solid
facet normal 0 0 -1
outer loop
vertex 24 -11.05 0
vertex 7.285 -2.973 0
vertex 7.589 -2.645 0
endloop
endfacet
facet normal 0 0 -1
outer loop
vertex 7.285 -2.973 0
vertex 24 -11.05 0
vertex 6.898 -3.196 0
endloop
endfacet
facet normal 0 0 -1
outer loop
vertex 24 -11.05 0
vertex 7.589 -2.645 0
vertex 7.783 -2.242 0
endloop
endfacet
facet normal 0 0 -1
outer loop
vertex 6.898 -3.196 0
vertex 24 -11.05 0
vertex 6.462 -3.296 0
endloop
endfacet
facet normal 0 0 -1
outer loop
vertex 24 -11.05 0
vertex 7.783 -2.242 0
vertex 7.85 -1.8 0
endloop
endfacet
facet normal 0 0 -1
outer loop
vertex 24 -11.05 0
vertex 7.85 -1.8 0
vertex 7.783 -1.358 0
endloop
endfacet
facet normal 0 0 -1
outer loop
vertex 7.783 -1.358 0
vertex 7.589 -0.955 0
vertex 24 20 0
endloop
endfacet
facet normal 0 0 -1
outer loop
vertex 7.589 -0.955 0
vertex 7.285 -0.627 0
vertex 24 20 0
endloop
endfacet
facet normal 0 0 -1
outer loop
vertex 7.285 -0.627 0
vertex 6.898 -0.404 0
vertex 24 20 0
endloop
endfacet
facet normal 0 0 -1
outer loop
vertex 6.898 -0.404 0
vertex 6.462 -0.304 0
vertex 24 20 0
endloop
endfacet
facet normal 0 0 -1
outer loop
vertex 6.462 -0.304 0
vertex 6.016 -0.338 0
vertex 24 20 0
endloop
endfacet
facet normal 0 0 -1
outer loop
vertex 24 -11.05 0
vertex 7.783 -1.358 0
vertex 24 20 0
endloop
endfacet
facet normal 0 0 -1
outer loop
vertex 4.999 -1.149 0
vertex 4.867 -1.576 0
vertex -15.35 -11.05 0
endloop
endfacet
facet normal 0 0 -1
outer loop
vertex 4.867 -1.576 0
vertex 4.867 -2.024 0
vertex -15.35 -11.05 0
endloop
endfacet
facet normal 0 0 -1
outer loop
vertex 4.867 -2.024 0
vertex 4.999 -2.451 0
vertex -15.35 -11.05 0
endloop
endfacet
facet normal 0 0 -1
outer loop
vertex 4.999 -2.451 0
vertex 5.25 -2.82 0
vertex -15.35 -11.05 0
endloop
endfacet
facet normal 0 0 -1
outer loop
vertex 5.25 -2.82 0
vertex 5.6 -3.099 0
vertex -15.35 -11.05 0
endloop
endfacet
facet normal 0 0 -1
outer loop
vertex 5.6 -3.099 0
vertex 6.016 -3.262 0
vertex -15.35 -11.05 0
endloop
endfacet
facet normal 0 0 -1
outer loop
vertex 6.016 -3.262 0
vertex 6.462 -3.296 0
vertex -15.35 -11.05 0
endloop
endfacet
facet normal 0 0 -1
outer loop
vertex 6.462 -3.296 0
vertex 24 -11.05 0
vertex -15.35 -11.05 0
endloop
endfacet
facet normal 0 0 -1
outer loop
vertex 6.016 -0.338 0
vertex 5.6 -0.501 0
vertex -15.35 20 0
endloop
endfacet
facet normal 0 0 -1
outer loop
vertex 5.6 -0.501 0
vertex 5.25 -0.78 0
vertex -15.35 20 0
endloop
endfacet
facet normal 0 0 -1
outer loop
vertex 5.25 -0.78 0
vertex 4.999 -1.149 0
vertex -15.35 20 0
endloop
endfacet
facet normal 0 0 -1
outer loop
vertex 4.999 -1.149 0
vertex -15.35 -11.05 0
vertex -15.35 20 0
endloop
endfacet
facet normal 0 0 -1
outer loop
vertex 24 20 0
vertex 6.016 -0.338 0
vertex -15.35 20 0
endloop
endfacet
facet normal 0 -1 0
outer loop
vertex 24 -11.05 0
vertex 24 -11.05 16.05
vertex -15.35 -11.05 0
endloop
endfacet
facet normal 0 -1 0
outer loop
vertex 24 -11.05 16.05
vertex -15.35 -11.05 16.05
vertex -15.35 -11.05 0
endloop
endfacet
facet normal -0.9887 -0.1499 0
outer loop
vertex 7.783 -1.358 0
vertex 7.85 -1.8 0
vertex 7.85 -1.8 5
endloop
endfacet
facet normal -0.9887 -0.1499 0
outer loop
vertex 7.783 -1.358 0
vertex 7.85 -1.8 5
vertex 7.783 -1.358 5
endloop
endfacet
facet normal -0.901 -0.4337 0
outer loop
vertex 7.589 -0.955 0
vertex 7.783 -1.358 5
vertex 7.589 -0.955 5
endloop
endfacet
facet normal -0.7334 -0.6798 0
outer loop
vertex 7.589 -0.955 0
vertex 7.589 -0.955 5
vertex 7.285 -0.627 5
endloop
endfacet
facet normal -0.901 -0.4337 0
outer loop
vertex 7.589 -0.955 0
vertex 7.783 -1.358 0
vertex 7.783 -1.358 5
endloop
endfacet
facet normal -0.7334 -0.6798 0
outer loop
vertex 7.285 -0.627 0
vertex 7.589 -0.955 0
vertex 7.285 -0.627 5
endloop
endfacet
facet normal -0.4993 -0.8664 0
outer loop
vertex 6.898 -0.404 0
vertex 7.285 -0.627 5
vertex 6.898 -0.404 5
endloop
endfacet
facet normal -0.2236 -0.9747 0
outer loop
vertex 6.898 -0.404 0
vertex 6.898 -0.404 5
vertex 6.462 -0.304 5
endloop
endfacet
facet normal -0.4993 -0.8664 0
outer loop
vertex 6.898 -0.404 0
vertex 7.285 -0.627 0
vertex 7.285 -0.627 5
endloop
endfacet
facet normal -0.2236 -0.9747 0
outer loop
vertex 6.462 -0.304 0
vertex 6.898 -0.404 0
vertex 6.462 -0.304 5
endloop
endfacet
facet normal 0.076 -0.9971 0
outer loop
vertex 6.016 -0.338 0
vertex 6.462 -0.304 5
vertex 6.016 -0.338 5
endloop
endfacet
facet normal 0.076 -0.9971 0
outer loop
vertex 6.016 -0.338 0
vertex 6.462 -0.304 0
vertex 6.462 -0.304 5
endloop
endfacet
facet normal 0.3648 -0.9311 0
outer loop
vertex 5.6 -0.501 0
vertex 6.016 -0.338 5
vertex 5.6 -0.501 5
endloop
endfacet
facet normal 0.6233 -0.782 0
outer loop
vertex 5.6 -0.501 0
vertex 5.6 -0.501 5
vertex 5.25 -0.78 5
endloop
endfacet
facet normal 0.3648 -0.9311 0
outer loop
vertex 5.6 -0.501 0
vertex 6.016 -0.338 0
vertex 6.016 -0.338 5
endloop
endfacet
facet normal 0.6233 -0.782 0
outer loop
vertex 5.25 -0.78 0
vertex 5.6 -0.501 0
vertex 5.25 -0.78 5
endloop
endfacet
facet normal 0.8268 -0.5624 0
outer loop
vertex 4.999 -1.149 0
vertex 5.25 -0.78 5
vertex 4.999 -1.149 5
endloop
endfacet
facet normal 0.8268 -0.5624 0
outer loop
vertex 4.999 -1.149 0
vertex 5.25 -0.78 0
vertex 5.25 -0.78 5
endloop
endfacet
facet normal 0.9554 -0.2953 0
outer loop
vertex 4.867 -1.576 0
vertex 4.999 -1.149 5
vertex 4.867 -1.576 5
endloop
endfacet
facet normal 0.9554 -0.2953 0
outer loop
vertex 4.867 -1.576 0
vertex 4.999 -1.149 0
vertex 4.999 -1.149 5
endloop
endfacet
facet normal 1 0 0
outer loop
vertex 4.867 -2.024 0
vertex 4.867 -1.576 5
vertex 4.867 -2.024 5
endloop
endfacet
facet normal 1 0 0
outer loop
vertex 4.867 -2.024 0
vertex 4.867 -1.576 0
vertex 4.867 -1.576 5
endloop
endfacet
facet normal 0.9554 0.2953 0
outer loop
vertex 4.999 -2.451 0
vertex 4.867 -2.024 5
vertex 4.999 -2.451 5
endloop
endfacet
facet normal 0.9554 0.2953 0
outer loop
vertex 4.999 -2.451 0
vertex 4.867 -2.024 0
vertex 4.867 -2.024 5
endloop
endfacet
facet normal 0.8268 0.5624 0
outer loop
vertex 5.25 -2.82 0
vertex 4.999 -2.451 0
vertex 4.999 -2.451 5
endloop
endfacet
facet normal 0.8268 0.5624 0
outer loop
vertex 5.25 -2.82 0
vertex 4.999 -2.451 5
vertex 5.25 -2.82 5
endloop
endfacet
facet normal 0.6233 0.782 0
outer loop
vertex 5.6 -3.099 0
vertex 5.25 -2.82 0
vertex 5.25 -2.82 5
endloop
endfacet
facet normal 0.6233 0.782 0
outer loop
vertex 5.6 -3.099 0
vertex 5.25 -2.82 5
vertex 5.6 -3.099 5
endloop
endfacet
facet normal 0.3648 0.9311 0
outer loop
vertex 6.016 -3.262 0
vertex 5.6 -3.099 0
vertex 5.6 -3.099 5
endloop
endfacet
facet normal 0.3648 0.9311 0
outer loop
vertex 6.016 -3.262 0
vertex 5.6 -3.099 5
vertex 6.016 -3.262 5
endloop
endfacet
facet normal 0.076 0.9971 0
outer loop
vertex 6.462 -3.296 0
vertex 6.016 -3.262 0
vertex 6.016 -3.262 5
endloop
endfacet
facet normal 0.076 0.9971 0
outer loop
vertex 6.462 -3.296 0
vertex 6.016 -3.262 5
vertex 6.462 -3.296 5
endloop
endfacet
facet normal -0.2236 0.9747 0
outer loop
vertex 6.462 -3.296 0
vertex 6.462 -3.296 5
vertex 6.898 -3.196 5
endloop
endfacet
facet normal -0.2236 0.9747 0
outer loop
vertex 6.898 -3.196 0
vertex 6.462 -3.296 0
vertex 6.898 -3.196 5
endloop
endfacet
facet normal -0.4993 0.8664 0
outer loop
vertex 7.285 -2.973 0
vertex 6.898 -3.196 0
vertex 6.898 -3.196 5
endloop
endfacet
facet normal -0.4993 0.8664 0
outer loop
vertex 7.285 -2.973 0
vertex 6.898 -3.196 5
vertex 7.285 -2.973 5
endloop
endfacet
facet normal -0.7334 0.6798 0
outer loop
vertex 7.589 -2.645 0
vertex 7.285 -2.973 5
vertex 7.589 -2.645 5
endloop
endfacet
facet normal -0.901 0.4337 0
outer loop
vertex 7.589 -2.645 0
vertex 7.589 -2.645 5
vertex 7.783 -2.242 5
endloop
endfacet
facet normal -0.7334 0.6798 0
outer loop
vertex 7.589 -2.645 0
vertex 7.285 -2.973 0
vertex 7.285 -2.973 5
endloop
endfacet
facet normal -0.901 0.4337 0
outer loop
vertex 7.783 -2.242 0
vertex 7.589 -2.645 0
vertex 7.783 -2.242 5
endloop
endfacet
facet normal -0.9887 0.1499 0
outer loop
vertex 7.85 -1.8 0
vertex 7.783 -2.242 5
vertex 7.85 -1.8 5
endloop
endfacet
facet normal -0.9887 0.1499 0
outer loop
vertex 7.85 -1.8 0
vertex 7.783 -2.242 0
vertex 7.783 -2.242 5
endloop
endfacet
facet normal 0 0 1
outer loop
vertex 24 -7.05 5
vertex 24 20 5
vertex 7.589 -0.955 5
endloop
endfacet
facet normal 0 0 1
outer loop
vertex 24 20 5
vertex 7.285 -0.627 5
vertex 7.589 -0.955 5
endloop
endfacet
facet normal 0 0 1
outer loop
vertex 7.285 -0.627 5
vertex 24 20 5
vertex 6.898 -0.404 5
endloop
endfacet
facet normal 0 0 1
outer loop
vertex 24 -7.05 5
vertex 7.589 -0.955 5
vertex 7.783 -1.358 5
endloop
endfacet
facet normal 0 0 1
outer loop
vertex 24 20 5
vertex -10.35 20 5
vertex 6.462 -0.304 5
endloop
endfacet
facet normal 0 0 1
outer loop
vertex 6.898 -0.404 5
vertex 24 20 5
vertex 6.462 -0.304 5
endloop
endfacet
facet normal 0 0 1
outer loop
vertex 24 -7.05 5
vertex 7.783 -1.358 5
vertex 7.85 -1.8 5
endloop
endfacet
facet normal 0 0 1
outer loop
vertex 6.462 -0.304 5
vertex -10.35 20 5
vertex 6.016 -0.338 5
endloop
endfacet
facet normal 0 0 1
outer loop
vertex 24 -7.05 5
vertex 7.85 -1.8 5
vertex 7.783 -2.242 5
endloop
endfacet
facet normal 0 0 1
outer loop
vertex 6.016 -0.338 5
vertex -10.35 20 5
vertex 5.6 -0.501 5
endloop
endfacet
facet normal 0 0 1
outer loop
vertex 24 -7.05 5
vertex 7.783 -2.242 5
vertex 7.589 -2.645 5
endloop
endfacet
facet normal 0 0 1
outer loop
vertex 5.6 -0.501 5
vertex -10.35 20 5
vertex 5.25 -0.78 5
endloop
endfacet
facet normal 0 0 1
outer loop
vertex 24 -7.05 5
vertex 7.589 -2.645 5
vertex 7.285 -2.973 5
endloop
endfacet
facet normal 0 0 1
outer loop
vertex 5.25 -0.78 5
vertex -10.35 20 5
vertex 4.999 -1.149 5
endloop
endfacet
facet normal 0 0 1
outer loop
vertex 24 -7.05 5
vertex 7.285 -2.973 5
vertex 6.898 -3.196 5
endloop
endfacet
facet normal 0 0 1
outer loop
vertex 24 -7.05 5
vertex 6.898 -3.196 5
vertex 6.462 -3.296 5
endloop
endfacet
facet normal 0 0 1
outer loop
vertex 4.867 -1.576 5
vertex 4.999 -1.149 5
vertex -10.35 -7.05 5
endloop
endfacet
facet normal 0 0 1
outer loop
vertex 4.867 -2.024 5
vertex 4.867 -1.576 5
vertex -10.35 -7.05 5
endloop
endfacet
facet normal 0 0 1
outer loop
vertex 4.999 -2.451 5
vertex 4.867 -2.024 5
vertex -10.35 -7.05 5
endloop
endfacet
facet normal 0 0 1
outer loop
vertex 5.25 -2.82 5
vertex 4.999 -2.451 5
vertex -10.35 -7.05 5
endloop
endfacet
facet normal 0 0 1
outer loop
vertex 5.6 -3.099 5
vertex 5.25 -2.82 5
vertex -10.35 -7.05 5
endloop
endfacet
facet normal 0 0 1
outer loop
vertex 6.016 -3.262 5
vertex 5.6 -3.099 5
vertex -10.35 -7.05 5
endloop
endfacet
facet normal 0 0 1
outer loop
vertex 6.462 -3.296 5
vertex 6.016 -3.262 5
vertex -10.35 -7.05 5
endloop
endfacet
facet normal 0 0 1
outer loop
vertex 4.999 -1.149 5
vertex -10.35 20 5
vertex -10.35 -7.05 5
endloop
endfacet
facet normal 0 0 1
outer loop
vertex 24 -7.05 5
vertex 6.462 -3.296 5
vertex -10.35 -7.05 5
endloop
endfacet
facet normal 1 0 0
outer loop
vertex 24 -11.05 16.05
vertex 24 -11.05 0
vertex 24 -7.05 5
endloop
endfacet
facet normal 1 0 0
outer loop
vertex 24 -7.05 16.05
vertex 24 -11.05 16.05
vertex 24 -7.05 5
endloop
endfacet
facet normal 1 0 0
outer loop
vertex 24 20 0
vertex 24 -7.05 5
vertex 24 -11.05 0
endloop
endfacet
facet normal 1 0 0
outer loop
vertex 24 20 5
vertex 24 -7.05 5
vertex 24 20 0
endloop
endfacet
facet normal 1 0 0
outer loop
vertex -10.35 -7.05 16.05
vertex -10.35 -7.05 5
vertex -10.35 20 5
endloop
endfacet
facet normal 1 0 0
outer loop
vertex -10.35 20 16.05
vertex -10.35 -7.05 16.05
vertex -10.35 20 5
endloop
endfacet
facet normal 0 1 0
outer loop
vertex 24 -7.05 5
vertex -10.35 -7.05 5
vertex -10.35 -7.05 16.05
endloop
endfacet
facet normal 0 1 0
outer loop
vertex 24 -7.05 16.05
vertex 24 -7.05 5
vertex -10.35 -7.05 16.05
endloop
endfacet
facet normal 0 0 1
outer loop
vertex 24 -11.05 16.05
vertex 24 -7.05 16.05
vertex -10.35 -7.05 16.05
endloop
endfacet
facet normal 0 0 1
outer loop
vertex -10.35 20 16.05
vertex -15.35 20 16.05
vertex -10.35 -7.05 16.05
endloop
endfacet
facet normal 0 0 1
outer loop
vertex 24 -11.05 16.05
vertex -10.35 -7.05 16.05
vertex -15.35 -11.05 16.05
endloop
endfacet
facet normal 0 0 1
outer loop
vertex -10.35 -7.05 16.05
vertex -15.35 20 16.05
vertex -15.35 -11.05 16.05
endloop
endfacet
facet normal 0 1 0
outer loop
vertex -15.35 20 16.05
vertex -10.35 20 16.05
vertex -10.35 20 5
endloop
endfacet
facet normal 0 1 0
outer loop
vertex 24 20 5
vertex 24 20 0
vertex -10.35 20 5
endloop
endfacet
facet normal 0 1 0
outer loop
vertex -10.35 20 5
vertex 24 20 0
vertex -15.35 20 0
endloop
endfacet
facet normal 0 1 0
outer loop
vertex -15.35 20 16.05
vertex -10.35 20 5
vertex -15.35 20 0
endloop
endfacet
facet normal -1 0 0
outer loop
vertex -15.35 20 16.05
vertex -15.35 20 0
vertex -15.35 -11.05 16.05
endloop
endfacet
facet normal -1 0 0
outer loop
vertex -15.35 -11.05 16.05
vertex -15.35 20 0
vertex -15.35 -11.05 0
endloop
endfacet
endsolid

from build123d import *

# Parameters (mm, degrees)
F0_W     = 25.35
F0_H     = 31.05
F0_R     = 1.5
F1_DEPTH = 5
F3_DEPTH = 11.05
F5_DEPTH = 14


with BuildPart() as f1:
    # F0 (on Top) → F1 (new body)
    with BuildSketch(Plane.XY):
        with Locations((-2.675, 4.475)):
            Rectangle(F0_W, F0_H)
        with Locations((6.35, -1.8)):
            Circle(F0_R, mode=Mode.SUBTRACT)
    extrude(amount=F1_DEPTH)

    # F2 (on face) → F3 (join)
    with BuildSketch(Plane.XY.offset(5)):
        Polygon((-10.35, 20), (-15.35, 20), (-15.35, -11.05), (10, -11.05), (10, -7.05), (-10.35, -7.05), align=None)
    extrude(amount=F3_DEPTH)

    # F4 (on face) → F5 (join)
    with BuildSketch(Plane.YZ.offset(10)):
        Polygon((-7.05, 16.05), (-11.05, 16.05), (-11.05, 0), (20, 0), (20, 5), (-7.05, 5), align=None)
    extrude(amount=F5_DEPTH)


solid = f1.part
